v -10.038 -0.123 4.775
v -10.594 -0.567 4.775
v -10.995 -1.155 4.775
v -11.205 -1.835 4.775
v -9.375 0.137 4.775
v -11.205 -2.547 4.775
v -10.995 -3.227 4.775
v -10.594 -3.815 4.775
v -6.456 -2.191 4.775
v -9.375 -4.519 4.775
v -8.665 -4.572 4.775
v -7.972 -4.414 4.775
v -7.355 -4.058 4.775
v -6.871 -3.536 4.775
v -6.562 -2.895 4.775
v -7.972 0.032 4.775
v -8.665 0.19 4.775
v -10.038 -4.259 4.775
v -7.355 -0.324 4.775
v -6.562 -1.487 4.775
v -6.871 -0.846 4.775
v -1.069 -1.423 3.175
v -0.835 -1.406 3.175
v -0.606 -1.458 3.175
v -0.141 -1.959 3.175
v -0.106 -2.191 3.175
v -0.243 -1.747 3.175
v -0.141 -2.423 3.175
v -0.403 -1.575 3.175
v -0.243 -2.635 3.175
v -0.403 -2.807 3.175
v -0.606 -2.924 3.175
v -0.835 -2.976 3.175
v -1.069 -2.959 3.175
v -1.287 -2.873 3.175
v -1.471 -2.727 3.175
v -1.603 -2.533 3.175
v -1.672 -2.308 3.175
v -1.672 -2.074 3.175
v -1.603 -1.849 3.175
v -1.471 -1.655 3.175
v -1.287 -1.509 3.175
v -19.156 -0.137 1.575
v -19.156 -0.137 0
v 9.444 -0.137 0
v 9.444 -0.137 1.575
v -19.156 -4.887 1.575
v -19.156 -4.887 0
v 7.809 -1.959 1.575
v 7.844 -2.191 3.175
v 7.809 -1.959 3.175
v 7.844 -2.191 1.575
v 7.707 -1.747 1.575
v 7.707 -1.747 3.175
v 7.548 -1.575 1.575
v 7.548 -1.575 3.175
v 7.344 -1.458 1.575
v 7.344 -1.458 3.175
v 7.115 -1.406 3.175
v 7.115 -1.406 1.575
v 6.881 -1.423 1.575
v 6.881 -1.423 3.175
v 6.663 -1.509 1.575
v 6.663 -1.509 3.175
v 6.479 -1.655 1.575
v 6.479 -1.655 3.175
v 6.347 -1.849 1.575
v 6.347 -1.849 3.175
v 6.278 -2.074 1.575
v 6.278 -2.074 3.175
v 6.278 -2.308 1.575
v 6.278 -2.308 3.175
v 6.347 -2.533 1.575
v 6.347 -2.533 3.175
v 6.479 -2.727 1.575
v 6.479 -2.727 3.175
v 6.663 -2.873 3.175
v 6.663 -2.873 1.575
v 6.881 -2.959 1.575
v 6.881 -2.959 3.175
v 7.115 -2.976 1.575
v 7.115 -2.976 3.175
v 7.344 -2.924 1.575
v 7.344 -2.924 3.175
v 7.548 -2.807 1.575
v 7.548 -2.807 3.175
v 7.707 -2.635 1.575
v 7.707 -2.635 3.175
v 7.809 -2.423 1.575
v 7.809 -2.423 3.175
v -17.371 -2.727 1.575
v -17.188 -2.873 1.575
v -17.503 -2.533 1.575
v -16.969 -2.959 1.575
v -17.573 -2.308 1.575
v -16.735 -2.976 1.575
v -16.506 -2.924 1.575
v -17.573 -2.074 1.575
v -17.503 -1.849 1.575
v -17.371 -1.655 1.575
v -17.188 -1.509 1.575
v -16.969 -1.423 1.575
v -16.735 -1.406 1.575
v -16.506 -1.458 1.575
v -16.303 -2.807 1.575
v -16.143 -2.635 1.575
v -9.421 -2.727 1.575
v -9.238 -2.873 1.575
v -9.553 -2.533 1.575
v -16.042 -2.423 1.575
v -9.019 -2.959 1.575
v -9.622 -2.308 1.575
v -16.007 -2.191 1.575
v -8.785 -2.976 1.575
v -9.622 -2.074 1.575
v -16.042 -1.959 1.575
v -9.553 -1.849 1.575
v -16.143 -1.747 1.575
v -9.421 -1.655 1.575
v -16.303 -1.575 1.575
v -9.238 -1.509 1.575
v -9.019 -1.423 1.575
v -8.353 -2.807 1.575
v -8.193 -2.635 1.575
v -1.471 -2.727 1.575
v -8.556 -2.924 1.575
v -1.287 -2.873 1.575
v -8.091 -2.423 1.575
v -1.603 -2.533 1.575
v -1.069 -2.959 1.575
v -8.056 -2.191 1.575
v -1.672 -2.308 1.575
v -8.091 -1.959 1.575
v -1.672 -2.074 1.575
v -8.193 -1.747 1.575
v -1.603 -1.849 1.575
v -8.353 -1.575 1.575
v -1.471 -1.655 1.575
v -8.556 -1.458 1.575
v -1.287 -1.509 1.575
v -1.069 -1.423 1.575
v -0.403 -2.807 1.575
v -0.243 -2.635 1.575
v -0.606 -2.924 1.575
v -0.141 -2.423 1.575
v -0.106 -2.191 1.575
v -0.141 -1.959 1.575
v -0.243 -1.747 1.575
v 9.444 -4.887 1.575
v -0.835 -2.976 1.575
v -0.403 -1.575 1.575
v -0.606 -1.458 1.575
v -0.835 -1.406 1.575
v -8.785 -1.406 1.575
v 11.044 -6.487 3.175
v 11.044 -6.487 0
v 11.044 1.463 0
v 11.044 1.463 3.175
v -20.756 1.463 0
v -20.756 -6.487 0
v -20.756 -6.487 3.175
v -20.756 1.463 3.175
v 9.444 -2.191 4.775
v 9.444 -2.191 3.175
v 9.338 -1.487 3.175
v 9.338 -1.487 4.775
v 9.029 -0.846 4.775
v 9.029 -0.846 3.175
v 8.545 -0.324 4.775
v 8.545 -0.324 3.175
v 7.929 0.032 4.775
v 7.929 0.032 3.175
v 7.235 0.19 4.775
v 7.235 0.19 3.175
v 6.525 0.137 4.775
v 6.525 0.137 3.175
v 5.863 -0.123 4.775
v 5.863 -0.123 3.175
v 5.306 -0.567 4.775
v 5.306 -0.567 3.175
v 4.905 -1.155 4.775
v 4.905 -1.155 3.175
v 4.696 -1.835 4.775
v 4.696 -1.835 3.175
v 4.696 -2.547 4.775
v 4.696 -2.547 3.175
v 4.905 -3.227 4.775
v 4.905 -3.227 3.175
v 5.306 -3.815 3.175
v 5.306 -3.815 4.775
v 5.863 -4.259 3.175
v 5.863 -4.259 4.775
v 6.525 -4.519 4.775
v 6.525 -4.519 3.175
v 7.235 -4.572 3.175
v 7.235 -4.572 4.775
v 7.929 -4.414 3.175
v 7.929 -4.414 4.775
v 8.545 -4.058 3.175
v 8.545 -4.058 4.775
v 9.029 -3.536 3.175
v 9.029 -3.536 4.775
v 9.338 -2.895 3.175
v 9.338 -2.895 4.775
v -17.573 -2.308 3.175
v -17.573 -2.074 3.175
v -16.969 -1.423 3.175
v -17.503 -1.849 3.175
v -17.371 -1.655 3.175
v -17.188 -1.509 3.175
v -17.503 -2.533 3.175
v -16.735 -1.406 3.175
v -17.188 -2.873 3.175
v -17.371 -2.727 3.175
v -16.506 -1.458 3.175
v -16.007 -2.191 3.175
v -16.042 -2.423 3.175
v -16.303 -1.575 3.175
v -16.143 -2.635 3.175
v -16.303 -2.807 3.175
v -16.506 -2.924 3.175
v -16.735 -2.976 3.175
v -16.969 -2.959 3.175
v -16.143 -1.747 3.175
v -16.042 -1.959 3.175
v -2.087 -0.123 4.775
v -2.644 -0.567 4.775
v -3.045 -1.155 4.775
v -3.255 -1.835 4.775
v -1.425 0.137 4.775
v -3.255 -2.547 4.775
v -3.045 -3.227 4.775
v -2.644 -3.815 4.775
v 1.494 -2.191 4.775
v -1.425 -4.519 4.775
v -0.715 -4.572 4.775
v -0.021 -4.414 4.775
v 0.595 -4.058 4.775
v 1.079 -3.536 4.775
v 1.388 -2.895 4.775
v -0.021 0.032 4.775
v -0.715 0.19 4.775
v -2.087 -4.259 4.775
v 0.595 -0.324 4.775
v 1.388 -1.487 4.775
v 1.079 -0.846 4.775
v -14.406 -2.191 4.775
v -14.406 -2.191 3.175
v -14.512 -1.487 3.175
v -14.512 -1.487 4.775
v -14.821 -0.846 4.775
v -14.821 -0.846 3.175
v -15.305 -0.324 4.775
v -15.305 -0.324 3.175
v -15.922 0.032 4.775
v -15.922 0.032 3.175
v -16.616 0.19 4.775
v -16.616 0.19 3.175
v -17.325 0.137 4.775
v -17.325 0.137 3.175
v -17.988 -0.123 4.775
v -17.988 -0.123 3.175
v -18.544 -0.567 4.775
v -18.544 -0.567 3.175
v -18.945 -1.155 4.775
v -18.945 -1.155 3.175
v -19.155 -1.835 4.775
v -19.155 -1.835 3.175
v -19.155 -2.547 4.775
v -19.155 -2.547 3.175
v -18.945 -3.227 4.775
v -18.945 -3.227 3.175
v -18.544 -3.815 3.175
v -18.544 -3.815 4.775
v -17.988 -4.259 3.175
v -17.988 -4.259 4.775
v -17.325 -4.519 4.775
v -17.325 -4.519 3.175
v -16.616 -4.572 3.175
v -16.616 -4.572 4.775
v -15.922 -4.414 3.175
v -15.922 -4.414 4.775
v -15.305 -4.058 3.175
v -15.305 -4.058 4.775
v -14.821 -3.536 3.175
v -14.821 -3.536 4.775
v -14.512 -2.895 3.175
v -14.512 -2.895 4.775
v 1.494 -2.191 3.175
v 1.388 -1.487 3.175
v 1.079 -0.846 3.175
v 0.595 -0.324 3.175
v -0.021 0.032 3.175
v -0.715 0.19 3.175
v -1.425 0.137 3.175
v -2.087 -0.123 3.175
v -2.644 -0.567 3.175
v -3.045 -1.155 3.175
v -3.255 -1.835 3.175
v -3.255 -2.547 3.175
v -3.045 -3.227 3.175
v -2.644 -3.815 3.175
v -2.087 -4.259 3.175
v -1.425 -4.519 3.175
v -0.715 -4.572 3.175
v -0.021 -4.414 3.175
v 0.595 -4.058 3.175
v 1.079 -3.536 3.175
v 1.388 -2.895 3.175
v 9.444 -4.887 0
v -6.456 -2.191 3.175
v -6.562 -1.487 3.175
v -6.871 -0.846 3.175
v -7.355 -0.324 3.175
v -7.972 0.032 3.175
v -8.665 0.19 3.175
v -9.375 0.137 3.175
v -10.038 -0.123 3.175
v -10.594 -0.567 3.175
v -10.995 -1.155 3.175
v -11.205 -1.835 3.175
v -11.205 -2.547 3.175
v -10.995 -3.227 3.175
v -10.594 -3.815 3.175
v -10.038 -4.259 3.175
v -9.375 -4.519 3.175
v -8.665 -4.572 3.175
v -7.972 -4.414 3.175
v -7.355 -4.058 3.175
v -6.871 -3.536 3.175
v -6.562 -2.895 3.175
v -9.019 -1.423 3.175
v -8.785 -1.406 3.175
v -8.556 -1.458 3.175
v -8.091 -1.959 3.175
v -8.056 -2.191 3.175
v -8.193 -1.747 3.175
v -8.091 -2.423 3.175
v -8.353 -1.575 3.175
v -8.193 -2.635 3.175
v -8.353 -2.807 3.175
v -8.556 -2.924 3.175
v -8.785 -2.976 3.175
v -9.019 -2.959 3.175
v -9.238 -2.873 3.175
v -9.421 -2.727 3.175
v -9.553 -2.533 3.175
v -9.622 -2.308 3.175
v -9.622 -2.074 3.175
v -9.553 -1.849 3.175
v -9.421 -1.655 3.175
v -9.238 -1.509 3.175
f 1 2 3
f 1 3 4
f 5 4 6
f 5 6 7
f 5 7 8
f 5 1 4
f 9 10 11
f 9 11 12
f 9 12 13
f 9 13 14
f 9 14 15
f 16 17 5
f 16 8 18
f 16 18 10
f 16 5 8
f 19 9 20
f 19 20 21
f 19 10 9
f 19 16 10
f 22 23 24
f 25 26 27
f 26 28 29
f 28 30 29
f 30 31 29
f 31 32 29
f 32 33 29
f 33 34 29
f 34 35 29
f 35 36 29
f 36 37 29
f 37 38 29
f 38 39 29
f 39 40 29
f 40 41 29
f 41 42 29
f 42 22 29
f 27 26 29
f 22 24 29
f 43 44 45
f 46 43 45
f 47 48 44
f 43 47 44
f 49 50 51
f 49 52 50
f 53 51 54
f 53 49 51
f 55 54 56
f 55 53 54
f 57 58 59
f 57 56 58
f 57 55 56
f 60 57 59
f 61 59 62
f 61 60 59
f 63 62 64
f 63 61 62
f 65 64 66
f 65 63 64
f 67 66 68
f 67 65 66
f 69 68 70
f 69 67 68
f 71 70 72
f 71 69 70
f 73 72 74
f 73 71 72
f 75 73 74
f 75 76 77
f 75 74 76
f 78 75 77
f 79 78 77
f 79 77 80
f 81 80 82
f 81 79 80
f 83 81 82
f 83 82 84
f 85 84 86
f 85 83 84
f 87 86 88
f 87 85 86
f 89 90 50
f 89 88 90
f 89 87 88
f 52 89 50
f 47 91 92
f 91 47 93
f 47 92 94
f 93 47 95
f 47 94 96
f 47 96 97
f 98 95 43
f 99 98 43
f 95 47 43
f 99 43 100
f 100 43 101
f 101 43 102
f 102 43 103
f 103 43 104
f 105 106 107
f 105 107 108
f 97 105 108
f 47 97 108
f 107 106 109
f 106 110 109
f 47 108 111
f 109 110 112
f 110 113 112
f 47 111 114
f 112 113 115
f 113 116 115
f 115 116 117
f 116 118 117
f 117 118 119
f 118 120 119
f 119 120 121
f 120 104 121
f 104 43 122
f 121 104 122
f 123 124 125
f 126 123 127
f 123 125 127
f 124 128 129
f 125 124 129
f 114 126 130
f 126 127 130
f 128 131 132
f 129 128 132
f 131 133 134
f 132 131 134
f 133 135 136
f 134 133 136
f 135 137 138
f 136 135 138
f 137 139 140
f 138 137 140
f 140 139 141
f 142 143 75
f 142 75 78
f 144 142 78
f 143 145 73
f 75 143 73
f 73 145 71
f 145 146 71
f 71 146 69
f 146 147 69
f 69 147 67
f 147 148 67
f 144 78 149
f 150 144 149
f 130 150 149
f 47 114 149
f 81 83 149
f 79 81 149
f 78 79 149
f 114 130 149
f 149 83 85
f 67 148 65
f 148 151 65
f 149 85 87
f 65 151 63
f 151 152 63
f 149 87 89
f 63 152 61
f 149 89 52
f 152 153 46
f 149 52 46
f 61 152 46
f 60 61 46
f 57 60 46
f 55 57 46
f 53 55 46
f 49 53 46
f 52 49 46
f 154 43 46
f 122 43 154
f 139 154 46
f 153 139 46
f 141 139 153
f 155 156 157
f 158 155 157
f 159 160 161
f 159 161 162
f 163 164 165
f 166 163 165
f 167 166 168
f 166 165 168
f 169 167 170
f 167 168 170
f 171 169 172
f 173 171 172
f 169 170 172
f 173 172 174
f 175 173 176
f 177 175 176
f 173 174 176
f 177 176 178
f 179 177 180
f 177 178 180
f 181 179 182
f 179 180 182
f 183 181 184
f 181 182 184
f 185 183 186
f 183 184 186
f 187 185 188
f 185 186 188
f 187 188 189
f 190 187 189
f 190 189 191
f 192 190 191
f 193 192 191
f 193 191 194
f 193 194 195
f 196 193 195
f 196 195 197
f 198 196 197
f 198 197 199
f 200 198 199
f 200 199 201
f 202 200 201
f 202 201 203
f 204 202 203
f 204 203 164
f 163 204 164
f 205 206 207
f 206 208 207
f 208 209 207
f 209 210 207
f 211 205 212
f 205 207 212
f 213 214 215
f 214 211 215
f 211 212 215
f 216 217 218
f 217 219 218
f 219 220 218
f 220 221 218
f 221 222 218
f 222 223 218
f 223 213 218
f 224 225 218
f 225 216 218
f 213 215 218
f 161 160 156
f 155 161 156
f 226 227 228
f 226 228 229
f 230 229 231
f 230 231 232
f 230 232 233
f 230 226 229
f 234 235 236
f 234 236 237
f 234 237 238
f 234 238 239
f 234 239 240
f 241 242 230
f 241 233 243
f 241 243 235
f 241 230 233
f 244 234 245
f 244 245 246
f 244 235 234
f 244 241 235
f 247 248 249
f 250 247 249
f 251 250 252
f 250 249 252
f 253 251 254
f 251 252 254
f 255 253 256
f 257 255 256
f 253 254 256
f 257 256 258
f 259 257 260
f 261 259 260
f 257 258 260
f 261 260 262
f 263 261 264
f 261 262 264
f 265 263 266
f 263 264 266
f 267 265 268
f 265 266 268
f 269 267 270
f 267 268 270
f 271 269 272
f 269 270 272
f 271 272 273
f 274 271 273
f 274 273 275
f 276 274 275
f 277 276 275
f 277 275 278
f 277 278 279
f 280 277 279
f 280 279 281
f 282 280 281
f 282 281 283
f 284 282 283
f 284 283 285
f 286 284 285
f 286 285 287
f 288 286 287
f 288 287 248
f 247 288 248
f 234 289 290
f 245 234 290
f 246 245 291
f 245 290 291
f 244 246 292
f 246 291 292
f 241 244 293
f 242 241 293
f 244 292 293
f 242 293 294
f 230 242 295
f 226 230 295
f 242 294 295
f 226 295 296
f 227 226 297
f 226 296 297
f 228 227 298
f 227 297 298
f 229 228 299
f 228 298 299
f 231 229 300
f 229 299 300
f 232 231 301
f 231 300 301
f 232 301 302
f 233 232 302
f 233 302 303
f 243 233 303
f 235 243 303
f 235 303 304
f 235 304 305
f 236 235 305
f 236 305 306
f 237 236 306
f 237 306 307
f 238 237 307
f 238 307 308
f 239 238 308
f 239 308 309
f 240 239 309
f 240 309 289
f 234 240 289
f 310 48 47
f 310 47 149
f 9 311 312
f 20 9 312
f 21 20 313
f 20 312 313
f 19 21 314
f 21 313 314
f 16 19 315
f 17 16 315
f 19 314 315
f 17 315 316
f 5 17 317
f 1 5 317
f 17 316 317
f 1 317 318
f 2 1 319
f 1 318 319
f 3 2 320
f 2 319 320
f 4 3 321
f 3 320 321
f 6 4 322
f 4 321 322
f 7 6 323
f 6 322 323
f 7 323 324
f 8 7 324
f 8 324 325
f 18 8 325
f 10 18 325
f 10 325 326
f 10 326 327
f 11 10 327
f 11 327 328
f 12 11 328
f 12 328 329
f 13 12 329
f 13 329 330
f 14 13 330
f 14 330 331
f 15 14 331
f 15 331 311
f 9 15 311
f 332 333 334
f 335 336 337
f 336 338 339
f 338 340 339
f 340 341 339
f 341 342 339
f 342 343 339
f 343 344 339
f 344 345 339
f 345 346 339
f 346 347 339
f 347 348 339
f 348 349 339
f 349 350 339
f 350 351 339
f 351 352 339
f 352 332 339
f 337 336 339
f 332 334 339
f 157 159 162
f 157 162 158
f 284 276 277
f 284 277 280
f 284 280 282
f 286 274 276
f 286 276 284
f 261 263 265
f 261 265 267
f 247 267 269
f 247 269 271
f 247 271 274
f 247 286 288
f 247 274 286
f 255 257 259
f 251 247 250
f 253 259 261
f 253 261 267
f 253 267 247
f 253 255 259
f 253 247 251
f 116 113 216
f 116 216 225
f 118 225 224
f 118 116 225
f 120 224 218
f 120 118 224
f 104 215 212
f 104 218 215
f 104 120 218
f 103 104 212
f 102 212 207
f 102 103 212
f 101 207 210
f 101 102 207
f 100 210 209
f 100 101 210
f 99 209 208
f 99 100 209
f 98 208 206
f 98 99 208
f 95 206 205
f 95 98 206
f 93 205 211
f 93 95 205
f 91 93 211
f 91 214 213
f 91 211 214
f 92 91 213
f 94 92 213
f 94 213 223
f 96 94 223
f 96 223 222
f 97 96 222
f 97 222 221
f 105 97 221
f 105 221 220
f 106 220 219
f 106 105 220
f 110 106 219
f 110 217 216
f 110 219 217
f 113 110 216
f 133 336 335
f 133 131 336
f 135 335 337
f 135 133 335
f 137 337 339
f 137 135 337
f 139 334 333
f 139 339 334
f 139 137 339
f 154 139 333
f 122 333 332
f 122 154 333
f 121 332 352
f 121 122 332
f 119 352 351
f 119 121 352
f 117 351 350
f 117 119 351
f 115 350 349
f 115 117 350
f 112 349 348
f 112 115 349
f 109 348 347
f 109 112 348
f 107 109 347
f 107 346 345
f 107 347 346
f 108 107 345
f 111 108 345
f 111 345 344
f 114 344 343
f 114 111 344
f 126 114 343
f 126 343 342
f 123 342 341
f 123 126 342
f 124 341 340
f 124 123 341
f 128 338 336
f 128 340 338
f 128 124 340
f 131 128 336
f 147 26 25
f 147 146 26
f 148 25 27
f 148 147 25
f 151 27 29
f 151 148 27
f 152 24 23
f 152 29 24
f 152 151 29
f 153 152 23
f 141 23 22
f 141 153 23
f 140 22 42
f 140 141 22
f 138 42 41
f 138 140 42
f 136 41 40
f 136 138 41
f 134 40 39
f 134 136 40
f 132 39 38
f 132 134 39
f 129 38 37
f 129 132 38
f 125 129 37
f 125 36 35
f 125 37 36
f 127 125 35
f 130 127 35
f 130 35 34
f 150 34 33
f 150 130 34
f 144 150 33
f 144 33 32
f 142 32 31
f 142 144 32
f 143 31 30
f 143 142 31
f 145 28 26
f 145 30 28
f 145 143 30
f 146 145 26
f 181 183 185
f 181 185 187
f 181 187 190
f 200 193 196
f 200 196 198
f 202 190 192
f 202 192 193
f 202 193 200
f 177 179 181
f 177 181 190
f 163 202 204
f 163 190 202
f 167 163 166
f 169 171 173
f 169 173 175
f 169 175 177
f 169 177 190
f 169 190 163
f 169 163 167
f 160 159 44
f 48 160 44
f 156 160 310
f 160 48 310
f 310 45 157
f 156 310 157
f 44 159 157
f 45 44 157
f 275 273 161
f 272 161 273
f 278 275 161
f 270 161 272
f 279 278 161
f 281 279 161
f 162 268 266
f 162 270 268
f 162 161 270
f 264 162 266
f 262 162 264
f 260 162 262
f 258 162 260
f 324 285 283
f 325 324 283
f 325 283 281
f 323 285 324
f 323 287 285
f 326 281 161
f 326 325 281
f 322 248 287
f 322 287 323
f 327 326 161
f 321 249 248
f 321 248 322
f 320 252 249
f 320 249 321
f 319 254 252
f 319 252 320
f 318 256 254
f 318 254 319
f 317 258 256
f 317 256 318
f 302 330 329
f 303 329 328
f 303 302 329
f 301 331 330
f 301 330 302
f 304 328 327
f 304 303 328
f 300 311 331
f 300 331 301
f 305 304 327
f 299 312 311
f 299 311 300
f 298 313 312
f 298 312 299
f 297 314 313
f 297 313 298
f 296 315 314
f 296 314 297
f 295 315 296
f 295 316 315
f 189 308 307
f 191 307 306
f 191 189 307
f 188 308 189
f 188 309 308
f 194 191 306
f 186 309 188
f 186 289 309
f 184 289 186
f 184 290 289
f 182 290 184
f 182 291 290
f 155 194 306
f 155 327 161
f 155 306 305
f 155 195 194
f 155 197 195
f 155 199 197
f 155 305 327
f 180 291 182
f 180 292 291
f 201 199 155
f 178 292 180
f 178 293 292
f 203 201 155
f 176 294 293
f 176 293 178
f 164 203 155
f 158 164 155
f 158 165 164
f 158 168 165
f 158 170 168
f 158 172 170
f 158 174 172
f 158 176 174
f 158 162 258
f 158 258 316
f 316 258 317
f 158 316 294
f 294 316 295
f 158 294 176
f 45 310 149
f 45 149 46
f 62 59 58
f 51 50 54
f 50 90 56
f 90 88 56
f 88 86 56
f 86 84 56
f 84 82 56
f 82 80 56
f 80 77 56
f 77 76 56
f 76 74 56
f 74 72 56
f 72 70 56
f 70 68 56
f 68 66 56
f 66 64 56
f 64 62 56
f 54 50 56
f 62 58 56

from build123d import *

# Parameters (mm, degrees)
F0_W     = 31.8008
F0_H     = 7.9502
F0_R     = 2.3876
F1_DEPTH = 3.175
F2_DEPTH = 4.7752
F3_T     = -1.6002


with BuildPart() as f1:
    # F0 (on Top) → F1 (new body)
    with BuildSketch(Plane.XY):
        with Locations((-4.8560211533, -2.5116165634)):
            Rectangle(F0_W, F0_H)
        with Locations((-16.7940211533, -2.1910497453)):
            Circle(F0_R, mode=Mode.SUBTRACT)
        with Locations((-8.8438211533, -2.1910497453)):
            Circle(F0_R, mode=Mode.SUBTRACT)
        with Locations((-0.8936211533, -2.1910497453)):
            Circle(F0_R, mode=Mode.SUBTRACT)
        with Locations((7.0565788467, -2.1910497453)):
            Circle(F0_R, mode=Mode.SUBTRACT)
    extrude(amount=F1_DEPTH)

    # F0 (on Top) → F2 (join)
    with BuildSketch(Plane.XY):
        with Locations((-16.7940211533, -2.1910497453)):
            Circle(F0_R)
        with Locations((-8.8438211533, -2.1910497453)):
            Circle(F0_R)
        with Locations((-0.8936211533, -2.1910497453)):
            Circle(F0_R)
        with Locations((7.0565788467, -2.1910497453)):
            Circle(F0_R)
    extrude(amount=F2_DEPTH)

    # F3
    f3_openings = [f1.faces().sort_by_distance(p)[0] for p in [
        (-4.856021, -2.511617, 0),
    ]]
    offset(amount=F3_T, openings=f3_openings, kind=Kind.INTERSECTION)


solid = f1.part
